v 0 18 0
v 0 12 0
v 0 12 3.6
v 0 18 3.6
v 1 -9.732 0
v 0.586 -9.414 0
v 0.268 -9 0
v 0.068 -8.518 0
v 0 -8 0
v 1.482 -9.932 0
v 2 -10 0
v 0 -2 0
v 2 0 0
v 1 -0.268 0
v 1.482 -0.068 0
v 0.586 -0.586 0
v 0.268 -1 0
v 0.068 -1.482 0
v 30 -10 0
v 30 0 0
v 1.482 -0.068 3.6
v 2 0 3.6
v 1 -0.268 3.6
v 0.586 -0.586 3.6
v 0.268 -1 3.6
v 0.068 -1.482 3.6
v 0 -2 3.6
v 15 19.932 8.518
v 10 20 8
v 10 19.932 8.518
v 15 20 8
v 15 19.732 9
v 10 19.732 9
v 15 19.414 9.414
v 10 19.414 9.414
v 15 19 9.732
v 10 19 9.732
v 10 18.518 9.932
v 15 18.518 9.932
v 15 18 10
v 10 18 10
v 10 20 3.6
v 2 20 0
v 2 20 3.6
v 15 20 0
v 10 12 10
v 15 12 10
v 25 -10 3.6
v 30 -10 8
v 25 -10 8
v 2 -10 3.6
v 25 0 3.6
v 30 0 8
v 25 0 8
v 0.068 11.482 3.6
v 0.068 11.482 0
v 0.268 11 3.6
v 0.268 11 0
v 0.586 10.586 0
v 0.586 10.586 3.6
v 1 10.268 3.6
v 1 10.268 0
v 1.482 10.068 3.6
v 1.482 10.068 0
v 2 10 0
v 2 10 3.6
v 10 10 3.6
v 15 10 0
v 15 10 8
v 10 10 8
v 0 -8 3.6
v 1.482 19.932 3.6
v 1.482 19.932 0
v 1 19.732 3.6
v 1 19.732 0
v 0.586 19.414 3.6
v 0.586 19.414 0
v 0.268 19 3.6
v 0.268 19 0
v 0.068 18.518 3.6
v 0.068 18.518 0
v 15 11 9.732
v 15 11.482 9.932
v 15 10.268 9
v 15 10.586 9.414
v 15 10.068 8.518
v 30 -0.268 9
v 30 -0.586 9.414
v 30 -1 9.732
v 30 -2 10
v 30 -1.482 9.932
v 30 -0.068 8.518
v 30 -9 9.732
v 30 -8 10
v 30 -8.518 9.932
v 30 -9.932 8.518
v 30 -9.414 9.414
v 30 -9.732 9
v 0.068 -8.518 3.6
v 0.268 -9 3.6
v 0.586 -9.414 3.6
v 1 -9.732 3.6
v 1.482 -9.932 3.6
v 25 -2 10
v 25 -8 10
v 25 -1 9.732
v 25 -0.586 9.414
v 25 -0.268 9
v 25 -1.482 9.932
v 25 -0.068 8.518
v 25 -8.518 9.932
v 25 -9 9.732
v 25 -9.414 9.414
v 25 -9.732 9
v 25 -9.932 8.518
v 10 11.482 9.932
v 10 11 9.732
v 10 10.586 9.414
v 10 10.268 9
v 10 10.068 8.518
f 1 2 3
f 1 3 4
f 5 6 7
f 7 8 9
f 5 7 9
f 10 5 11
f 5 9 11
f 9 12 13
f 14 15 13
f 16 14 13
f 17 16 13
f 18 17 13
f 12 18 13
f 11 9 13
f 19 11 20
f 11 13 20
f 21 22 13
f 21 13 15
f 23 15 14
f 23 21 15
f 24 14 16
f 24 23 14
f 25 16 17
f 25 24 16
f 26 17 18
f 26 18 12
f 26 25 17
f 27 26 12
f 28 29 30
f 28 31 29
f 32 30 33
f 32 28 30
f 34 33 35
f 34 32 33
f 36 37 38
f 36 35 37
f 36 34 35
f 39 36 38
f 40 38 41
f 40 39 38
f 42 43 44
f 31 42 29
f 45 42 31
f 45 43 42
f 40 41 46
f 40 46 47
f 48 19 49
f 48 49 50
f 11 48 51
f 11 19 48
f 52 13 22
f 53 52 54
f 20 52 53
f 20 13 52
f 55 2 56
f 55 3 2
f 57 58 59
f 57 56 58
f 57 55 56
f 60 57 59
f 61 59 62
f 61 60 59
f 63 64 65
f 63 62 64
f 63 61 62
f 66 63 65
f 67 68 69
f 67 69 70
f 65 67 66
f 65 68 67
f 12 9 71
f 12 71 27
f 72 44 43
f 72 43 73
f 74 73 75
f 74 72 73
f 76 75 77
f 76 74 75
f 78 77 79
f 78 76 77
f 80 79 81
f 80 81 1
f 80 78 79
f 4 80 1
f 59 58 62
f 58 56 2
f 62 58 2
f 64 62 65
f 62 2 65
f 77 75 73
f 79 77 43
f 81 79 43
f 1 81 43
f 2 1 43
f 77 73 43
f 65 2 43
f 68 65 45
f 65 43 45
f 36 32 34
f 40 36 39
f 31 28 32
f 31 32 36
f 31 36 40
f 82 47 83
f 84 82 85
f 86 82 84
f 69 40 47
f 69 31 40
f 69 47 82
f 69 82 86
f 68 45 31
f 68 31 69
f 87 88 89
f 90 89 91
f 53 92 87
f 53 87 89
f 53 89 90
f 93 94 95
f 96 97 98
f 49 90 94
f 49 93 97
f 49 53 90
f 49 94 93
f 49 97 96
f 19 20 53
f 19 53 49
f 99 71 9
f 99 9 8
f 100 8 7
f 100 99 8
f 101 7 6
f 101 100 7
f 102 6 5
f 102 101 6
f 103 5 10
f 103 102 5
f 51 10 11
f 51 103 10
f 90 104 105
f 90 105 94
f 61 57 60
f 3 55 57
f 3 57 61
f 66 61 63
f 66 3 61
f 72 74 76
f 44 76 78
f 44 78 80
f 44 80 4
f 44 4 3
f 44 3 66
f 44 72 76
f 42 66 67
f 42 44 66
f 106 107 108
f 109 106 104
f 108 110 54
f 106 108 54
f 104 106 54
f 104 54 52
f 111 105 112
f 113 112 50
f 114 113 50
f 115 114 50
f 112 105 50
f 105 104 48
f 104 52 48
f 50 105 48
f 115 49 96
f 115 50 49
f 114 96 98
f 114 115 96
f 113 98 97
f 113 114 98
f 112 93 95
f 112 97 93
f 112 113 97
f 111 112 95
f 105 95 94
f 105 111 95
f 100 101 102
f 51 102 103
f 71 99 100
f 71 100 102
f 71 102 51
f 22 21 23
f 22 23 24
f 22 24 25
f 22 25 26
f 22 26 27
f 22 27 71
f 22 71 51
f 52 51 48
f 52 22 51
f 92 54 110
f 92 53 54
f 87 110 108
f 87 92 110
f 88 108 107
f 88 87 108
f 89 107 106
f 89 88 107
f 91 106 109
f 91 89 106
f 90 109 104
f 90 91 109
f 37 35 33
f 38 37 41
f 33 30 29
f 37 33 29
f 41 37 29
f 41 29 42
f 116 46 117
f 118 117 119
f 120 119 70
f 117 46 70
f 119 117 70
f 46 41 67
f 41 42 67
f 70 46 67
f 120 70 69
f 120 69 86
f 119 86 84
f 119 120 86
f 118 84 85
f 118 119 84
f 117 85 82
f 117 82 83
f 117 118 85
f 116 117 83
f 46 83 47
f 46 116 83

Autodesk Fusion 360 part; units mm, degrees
sketch "Sketch1" plane through (0, 0, 0) normal (0, 0, 1) x (1, 0, 0)
  line L0 (0, 0) -> (30, 0)
  line L1 (30, 0) -> (30, -10)
  line L2 (30, -10) -> (0, -10)
  line L3 (0, -10) -> (0, 0)
  line L4 (25, 0) -> (25, -10)
  line L5 (0, 10) -> (0, 20)
  line L6 (15, 10) -> (0, 10)
  line L7 (0, 20) -> (15, 20)
  line L8 (15, 20) -> (15, 10)
  line L9 (10, 20) -> (10, 10)
  dimension "d1" = 30
  dimension "d2" = 10
  dimension "d3" = 5
  dimension "d12" = 15
  dimension "d13" = 10
  dimension "d14" = 5
extrude "Extrude1" add sketch "Sketch1" along normal blind 3.6 contours L0 L2 L3 L4 makes body 1
extrude "Extrude2" add sketch "Sketch1" along normal blind 10 contours L0 L1 L2 L4 bodies 1
fillet "Fillet1" radius 2 2 edges at (0, -10, 1.8) (0, 0, 1.8) on bodies 1
fillet "Fillet2" radius 2 2 edges at (27.5, 0, 10) (27.5, -10, 10) on bodies 1
extrude "Extrude3" add sketch "Sketch1" along normal blind 10 separate body contours L6 L7 L8 L9 makes body 2
extrude "Extrude4" add sketch "Sketch1" along normal blind 3.6 contours L5 L6 L7 L9 bodies 2
fillet "Fillet3" radius 2 4 edges at (12.5, 10, 10) (12.5, 20, 10) (0, 10, 1.8) (0, 20, 1.8) on bodies 2
